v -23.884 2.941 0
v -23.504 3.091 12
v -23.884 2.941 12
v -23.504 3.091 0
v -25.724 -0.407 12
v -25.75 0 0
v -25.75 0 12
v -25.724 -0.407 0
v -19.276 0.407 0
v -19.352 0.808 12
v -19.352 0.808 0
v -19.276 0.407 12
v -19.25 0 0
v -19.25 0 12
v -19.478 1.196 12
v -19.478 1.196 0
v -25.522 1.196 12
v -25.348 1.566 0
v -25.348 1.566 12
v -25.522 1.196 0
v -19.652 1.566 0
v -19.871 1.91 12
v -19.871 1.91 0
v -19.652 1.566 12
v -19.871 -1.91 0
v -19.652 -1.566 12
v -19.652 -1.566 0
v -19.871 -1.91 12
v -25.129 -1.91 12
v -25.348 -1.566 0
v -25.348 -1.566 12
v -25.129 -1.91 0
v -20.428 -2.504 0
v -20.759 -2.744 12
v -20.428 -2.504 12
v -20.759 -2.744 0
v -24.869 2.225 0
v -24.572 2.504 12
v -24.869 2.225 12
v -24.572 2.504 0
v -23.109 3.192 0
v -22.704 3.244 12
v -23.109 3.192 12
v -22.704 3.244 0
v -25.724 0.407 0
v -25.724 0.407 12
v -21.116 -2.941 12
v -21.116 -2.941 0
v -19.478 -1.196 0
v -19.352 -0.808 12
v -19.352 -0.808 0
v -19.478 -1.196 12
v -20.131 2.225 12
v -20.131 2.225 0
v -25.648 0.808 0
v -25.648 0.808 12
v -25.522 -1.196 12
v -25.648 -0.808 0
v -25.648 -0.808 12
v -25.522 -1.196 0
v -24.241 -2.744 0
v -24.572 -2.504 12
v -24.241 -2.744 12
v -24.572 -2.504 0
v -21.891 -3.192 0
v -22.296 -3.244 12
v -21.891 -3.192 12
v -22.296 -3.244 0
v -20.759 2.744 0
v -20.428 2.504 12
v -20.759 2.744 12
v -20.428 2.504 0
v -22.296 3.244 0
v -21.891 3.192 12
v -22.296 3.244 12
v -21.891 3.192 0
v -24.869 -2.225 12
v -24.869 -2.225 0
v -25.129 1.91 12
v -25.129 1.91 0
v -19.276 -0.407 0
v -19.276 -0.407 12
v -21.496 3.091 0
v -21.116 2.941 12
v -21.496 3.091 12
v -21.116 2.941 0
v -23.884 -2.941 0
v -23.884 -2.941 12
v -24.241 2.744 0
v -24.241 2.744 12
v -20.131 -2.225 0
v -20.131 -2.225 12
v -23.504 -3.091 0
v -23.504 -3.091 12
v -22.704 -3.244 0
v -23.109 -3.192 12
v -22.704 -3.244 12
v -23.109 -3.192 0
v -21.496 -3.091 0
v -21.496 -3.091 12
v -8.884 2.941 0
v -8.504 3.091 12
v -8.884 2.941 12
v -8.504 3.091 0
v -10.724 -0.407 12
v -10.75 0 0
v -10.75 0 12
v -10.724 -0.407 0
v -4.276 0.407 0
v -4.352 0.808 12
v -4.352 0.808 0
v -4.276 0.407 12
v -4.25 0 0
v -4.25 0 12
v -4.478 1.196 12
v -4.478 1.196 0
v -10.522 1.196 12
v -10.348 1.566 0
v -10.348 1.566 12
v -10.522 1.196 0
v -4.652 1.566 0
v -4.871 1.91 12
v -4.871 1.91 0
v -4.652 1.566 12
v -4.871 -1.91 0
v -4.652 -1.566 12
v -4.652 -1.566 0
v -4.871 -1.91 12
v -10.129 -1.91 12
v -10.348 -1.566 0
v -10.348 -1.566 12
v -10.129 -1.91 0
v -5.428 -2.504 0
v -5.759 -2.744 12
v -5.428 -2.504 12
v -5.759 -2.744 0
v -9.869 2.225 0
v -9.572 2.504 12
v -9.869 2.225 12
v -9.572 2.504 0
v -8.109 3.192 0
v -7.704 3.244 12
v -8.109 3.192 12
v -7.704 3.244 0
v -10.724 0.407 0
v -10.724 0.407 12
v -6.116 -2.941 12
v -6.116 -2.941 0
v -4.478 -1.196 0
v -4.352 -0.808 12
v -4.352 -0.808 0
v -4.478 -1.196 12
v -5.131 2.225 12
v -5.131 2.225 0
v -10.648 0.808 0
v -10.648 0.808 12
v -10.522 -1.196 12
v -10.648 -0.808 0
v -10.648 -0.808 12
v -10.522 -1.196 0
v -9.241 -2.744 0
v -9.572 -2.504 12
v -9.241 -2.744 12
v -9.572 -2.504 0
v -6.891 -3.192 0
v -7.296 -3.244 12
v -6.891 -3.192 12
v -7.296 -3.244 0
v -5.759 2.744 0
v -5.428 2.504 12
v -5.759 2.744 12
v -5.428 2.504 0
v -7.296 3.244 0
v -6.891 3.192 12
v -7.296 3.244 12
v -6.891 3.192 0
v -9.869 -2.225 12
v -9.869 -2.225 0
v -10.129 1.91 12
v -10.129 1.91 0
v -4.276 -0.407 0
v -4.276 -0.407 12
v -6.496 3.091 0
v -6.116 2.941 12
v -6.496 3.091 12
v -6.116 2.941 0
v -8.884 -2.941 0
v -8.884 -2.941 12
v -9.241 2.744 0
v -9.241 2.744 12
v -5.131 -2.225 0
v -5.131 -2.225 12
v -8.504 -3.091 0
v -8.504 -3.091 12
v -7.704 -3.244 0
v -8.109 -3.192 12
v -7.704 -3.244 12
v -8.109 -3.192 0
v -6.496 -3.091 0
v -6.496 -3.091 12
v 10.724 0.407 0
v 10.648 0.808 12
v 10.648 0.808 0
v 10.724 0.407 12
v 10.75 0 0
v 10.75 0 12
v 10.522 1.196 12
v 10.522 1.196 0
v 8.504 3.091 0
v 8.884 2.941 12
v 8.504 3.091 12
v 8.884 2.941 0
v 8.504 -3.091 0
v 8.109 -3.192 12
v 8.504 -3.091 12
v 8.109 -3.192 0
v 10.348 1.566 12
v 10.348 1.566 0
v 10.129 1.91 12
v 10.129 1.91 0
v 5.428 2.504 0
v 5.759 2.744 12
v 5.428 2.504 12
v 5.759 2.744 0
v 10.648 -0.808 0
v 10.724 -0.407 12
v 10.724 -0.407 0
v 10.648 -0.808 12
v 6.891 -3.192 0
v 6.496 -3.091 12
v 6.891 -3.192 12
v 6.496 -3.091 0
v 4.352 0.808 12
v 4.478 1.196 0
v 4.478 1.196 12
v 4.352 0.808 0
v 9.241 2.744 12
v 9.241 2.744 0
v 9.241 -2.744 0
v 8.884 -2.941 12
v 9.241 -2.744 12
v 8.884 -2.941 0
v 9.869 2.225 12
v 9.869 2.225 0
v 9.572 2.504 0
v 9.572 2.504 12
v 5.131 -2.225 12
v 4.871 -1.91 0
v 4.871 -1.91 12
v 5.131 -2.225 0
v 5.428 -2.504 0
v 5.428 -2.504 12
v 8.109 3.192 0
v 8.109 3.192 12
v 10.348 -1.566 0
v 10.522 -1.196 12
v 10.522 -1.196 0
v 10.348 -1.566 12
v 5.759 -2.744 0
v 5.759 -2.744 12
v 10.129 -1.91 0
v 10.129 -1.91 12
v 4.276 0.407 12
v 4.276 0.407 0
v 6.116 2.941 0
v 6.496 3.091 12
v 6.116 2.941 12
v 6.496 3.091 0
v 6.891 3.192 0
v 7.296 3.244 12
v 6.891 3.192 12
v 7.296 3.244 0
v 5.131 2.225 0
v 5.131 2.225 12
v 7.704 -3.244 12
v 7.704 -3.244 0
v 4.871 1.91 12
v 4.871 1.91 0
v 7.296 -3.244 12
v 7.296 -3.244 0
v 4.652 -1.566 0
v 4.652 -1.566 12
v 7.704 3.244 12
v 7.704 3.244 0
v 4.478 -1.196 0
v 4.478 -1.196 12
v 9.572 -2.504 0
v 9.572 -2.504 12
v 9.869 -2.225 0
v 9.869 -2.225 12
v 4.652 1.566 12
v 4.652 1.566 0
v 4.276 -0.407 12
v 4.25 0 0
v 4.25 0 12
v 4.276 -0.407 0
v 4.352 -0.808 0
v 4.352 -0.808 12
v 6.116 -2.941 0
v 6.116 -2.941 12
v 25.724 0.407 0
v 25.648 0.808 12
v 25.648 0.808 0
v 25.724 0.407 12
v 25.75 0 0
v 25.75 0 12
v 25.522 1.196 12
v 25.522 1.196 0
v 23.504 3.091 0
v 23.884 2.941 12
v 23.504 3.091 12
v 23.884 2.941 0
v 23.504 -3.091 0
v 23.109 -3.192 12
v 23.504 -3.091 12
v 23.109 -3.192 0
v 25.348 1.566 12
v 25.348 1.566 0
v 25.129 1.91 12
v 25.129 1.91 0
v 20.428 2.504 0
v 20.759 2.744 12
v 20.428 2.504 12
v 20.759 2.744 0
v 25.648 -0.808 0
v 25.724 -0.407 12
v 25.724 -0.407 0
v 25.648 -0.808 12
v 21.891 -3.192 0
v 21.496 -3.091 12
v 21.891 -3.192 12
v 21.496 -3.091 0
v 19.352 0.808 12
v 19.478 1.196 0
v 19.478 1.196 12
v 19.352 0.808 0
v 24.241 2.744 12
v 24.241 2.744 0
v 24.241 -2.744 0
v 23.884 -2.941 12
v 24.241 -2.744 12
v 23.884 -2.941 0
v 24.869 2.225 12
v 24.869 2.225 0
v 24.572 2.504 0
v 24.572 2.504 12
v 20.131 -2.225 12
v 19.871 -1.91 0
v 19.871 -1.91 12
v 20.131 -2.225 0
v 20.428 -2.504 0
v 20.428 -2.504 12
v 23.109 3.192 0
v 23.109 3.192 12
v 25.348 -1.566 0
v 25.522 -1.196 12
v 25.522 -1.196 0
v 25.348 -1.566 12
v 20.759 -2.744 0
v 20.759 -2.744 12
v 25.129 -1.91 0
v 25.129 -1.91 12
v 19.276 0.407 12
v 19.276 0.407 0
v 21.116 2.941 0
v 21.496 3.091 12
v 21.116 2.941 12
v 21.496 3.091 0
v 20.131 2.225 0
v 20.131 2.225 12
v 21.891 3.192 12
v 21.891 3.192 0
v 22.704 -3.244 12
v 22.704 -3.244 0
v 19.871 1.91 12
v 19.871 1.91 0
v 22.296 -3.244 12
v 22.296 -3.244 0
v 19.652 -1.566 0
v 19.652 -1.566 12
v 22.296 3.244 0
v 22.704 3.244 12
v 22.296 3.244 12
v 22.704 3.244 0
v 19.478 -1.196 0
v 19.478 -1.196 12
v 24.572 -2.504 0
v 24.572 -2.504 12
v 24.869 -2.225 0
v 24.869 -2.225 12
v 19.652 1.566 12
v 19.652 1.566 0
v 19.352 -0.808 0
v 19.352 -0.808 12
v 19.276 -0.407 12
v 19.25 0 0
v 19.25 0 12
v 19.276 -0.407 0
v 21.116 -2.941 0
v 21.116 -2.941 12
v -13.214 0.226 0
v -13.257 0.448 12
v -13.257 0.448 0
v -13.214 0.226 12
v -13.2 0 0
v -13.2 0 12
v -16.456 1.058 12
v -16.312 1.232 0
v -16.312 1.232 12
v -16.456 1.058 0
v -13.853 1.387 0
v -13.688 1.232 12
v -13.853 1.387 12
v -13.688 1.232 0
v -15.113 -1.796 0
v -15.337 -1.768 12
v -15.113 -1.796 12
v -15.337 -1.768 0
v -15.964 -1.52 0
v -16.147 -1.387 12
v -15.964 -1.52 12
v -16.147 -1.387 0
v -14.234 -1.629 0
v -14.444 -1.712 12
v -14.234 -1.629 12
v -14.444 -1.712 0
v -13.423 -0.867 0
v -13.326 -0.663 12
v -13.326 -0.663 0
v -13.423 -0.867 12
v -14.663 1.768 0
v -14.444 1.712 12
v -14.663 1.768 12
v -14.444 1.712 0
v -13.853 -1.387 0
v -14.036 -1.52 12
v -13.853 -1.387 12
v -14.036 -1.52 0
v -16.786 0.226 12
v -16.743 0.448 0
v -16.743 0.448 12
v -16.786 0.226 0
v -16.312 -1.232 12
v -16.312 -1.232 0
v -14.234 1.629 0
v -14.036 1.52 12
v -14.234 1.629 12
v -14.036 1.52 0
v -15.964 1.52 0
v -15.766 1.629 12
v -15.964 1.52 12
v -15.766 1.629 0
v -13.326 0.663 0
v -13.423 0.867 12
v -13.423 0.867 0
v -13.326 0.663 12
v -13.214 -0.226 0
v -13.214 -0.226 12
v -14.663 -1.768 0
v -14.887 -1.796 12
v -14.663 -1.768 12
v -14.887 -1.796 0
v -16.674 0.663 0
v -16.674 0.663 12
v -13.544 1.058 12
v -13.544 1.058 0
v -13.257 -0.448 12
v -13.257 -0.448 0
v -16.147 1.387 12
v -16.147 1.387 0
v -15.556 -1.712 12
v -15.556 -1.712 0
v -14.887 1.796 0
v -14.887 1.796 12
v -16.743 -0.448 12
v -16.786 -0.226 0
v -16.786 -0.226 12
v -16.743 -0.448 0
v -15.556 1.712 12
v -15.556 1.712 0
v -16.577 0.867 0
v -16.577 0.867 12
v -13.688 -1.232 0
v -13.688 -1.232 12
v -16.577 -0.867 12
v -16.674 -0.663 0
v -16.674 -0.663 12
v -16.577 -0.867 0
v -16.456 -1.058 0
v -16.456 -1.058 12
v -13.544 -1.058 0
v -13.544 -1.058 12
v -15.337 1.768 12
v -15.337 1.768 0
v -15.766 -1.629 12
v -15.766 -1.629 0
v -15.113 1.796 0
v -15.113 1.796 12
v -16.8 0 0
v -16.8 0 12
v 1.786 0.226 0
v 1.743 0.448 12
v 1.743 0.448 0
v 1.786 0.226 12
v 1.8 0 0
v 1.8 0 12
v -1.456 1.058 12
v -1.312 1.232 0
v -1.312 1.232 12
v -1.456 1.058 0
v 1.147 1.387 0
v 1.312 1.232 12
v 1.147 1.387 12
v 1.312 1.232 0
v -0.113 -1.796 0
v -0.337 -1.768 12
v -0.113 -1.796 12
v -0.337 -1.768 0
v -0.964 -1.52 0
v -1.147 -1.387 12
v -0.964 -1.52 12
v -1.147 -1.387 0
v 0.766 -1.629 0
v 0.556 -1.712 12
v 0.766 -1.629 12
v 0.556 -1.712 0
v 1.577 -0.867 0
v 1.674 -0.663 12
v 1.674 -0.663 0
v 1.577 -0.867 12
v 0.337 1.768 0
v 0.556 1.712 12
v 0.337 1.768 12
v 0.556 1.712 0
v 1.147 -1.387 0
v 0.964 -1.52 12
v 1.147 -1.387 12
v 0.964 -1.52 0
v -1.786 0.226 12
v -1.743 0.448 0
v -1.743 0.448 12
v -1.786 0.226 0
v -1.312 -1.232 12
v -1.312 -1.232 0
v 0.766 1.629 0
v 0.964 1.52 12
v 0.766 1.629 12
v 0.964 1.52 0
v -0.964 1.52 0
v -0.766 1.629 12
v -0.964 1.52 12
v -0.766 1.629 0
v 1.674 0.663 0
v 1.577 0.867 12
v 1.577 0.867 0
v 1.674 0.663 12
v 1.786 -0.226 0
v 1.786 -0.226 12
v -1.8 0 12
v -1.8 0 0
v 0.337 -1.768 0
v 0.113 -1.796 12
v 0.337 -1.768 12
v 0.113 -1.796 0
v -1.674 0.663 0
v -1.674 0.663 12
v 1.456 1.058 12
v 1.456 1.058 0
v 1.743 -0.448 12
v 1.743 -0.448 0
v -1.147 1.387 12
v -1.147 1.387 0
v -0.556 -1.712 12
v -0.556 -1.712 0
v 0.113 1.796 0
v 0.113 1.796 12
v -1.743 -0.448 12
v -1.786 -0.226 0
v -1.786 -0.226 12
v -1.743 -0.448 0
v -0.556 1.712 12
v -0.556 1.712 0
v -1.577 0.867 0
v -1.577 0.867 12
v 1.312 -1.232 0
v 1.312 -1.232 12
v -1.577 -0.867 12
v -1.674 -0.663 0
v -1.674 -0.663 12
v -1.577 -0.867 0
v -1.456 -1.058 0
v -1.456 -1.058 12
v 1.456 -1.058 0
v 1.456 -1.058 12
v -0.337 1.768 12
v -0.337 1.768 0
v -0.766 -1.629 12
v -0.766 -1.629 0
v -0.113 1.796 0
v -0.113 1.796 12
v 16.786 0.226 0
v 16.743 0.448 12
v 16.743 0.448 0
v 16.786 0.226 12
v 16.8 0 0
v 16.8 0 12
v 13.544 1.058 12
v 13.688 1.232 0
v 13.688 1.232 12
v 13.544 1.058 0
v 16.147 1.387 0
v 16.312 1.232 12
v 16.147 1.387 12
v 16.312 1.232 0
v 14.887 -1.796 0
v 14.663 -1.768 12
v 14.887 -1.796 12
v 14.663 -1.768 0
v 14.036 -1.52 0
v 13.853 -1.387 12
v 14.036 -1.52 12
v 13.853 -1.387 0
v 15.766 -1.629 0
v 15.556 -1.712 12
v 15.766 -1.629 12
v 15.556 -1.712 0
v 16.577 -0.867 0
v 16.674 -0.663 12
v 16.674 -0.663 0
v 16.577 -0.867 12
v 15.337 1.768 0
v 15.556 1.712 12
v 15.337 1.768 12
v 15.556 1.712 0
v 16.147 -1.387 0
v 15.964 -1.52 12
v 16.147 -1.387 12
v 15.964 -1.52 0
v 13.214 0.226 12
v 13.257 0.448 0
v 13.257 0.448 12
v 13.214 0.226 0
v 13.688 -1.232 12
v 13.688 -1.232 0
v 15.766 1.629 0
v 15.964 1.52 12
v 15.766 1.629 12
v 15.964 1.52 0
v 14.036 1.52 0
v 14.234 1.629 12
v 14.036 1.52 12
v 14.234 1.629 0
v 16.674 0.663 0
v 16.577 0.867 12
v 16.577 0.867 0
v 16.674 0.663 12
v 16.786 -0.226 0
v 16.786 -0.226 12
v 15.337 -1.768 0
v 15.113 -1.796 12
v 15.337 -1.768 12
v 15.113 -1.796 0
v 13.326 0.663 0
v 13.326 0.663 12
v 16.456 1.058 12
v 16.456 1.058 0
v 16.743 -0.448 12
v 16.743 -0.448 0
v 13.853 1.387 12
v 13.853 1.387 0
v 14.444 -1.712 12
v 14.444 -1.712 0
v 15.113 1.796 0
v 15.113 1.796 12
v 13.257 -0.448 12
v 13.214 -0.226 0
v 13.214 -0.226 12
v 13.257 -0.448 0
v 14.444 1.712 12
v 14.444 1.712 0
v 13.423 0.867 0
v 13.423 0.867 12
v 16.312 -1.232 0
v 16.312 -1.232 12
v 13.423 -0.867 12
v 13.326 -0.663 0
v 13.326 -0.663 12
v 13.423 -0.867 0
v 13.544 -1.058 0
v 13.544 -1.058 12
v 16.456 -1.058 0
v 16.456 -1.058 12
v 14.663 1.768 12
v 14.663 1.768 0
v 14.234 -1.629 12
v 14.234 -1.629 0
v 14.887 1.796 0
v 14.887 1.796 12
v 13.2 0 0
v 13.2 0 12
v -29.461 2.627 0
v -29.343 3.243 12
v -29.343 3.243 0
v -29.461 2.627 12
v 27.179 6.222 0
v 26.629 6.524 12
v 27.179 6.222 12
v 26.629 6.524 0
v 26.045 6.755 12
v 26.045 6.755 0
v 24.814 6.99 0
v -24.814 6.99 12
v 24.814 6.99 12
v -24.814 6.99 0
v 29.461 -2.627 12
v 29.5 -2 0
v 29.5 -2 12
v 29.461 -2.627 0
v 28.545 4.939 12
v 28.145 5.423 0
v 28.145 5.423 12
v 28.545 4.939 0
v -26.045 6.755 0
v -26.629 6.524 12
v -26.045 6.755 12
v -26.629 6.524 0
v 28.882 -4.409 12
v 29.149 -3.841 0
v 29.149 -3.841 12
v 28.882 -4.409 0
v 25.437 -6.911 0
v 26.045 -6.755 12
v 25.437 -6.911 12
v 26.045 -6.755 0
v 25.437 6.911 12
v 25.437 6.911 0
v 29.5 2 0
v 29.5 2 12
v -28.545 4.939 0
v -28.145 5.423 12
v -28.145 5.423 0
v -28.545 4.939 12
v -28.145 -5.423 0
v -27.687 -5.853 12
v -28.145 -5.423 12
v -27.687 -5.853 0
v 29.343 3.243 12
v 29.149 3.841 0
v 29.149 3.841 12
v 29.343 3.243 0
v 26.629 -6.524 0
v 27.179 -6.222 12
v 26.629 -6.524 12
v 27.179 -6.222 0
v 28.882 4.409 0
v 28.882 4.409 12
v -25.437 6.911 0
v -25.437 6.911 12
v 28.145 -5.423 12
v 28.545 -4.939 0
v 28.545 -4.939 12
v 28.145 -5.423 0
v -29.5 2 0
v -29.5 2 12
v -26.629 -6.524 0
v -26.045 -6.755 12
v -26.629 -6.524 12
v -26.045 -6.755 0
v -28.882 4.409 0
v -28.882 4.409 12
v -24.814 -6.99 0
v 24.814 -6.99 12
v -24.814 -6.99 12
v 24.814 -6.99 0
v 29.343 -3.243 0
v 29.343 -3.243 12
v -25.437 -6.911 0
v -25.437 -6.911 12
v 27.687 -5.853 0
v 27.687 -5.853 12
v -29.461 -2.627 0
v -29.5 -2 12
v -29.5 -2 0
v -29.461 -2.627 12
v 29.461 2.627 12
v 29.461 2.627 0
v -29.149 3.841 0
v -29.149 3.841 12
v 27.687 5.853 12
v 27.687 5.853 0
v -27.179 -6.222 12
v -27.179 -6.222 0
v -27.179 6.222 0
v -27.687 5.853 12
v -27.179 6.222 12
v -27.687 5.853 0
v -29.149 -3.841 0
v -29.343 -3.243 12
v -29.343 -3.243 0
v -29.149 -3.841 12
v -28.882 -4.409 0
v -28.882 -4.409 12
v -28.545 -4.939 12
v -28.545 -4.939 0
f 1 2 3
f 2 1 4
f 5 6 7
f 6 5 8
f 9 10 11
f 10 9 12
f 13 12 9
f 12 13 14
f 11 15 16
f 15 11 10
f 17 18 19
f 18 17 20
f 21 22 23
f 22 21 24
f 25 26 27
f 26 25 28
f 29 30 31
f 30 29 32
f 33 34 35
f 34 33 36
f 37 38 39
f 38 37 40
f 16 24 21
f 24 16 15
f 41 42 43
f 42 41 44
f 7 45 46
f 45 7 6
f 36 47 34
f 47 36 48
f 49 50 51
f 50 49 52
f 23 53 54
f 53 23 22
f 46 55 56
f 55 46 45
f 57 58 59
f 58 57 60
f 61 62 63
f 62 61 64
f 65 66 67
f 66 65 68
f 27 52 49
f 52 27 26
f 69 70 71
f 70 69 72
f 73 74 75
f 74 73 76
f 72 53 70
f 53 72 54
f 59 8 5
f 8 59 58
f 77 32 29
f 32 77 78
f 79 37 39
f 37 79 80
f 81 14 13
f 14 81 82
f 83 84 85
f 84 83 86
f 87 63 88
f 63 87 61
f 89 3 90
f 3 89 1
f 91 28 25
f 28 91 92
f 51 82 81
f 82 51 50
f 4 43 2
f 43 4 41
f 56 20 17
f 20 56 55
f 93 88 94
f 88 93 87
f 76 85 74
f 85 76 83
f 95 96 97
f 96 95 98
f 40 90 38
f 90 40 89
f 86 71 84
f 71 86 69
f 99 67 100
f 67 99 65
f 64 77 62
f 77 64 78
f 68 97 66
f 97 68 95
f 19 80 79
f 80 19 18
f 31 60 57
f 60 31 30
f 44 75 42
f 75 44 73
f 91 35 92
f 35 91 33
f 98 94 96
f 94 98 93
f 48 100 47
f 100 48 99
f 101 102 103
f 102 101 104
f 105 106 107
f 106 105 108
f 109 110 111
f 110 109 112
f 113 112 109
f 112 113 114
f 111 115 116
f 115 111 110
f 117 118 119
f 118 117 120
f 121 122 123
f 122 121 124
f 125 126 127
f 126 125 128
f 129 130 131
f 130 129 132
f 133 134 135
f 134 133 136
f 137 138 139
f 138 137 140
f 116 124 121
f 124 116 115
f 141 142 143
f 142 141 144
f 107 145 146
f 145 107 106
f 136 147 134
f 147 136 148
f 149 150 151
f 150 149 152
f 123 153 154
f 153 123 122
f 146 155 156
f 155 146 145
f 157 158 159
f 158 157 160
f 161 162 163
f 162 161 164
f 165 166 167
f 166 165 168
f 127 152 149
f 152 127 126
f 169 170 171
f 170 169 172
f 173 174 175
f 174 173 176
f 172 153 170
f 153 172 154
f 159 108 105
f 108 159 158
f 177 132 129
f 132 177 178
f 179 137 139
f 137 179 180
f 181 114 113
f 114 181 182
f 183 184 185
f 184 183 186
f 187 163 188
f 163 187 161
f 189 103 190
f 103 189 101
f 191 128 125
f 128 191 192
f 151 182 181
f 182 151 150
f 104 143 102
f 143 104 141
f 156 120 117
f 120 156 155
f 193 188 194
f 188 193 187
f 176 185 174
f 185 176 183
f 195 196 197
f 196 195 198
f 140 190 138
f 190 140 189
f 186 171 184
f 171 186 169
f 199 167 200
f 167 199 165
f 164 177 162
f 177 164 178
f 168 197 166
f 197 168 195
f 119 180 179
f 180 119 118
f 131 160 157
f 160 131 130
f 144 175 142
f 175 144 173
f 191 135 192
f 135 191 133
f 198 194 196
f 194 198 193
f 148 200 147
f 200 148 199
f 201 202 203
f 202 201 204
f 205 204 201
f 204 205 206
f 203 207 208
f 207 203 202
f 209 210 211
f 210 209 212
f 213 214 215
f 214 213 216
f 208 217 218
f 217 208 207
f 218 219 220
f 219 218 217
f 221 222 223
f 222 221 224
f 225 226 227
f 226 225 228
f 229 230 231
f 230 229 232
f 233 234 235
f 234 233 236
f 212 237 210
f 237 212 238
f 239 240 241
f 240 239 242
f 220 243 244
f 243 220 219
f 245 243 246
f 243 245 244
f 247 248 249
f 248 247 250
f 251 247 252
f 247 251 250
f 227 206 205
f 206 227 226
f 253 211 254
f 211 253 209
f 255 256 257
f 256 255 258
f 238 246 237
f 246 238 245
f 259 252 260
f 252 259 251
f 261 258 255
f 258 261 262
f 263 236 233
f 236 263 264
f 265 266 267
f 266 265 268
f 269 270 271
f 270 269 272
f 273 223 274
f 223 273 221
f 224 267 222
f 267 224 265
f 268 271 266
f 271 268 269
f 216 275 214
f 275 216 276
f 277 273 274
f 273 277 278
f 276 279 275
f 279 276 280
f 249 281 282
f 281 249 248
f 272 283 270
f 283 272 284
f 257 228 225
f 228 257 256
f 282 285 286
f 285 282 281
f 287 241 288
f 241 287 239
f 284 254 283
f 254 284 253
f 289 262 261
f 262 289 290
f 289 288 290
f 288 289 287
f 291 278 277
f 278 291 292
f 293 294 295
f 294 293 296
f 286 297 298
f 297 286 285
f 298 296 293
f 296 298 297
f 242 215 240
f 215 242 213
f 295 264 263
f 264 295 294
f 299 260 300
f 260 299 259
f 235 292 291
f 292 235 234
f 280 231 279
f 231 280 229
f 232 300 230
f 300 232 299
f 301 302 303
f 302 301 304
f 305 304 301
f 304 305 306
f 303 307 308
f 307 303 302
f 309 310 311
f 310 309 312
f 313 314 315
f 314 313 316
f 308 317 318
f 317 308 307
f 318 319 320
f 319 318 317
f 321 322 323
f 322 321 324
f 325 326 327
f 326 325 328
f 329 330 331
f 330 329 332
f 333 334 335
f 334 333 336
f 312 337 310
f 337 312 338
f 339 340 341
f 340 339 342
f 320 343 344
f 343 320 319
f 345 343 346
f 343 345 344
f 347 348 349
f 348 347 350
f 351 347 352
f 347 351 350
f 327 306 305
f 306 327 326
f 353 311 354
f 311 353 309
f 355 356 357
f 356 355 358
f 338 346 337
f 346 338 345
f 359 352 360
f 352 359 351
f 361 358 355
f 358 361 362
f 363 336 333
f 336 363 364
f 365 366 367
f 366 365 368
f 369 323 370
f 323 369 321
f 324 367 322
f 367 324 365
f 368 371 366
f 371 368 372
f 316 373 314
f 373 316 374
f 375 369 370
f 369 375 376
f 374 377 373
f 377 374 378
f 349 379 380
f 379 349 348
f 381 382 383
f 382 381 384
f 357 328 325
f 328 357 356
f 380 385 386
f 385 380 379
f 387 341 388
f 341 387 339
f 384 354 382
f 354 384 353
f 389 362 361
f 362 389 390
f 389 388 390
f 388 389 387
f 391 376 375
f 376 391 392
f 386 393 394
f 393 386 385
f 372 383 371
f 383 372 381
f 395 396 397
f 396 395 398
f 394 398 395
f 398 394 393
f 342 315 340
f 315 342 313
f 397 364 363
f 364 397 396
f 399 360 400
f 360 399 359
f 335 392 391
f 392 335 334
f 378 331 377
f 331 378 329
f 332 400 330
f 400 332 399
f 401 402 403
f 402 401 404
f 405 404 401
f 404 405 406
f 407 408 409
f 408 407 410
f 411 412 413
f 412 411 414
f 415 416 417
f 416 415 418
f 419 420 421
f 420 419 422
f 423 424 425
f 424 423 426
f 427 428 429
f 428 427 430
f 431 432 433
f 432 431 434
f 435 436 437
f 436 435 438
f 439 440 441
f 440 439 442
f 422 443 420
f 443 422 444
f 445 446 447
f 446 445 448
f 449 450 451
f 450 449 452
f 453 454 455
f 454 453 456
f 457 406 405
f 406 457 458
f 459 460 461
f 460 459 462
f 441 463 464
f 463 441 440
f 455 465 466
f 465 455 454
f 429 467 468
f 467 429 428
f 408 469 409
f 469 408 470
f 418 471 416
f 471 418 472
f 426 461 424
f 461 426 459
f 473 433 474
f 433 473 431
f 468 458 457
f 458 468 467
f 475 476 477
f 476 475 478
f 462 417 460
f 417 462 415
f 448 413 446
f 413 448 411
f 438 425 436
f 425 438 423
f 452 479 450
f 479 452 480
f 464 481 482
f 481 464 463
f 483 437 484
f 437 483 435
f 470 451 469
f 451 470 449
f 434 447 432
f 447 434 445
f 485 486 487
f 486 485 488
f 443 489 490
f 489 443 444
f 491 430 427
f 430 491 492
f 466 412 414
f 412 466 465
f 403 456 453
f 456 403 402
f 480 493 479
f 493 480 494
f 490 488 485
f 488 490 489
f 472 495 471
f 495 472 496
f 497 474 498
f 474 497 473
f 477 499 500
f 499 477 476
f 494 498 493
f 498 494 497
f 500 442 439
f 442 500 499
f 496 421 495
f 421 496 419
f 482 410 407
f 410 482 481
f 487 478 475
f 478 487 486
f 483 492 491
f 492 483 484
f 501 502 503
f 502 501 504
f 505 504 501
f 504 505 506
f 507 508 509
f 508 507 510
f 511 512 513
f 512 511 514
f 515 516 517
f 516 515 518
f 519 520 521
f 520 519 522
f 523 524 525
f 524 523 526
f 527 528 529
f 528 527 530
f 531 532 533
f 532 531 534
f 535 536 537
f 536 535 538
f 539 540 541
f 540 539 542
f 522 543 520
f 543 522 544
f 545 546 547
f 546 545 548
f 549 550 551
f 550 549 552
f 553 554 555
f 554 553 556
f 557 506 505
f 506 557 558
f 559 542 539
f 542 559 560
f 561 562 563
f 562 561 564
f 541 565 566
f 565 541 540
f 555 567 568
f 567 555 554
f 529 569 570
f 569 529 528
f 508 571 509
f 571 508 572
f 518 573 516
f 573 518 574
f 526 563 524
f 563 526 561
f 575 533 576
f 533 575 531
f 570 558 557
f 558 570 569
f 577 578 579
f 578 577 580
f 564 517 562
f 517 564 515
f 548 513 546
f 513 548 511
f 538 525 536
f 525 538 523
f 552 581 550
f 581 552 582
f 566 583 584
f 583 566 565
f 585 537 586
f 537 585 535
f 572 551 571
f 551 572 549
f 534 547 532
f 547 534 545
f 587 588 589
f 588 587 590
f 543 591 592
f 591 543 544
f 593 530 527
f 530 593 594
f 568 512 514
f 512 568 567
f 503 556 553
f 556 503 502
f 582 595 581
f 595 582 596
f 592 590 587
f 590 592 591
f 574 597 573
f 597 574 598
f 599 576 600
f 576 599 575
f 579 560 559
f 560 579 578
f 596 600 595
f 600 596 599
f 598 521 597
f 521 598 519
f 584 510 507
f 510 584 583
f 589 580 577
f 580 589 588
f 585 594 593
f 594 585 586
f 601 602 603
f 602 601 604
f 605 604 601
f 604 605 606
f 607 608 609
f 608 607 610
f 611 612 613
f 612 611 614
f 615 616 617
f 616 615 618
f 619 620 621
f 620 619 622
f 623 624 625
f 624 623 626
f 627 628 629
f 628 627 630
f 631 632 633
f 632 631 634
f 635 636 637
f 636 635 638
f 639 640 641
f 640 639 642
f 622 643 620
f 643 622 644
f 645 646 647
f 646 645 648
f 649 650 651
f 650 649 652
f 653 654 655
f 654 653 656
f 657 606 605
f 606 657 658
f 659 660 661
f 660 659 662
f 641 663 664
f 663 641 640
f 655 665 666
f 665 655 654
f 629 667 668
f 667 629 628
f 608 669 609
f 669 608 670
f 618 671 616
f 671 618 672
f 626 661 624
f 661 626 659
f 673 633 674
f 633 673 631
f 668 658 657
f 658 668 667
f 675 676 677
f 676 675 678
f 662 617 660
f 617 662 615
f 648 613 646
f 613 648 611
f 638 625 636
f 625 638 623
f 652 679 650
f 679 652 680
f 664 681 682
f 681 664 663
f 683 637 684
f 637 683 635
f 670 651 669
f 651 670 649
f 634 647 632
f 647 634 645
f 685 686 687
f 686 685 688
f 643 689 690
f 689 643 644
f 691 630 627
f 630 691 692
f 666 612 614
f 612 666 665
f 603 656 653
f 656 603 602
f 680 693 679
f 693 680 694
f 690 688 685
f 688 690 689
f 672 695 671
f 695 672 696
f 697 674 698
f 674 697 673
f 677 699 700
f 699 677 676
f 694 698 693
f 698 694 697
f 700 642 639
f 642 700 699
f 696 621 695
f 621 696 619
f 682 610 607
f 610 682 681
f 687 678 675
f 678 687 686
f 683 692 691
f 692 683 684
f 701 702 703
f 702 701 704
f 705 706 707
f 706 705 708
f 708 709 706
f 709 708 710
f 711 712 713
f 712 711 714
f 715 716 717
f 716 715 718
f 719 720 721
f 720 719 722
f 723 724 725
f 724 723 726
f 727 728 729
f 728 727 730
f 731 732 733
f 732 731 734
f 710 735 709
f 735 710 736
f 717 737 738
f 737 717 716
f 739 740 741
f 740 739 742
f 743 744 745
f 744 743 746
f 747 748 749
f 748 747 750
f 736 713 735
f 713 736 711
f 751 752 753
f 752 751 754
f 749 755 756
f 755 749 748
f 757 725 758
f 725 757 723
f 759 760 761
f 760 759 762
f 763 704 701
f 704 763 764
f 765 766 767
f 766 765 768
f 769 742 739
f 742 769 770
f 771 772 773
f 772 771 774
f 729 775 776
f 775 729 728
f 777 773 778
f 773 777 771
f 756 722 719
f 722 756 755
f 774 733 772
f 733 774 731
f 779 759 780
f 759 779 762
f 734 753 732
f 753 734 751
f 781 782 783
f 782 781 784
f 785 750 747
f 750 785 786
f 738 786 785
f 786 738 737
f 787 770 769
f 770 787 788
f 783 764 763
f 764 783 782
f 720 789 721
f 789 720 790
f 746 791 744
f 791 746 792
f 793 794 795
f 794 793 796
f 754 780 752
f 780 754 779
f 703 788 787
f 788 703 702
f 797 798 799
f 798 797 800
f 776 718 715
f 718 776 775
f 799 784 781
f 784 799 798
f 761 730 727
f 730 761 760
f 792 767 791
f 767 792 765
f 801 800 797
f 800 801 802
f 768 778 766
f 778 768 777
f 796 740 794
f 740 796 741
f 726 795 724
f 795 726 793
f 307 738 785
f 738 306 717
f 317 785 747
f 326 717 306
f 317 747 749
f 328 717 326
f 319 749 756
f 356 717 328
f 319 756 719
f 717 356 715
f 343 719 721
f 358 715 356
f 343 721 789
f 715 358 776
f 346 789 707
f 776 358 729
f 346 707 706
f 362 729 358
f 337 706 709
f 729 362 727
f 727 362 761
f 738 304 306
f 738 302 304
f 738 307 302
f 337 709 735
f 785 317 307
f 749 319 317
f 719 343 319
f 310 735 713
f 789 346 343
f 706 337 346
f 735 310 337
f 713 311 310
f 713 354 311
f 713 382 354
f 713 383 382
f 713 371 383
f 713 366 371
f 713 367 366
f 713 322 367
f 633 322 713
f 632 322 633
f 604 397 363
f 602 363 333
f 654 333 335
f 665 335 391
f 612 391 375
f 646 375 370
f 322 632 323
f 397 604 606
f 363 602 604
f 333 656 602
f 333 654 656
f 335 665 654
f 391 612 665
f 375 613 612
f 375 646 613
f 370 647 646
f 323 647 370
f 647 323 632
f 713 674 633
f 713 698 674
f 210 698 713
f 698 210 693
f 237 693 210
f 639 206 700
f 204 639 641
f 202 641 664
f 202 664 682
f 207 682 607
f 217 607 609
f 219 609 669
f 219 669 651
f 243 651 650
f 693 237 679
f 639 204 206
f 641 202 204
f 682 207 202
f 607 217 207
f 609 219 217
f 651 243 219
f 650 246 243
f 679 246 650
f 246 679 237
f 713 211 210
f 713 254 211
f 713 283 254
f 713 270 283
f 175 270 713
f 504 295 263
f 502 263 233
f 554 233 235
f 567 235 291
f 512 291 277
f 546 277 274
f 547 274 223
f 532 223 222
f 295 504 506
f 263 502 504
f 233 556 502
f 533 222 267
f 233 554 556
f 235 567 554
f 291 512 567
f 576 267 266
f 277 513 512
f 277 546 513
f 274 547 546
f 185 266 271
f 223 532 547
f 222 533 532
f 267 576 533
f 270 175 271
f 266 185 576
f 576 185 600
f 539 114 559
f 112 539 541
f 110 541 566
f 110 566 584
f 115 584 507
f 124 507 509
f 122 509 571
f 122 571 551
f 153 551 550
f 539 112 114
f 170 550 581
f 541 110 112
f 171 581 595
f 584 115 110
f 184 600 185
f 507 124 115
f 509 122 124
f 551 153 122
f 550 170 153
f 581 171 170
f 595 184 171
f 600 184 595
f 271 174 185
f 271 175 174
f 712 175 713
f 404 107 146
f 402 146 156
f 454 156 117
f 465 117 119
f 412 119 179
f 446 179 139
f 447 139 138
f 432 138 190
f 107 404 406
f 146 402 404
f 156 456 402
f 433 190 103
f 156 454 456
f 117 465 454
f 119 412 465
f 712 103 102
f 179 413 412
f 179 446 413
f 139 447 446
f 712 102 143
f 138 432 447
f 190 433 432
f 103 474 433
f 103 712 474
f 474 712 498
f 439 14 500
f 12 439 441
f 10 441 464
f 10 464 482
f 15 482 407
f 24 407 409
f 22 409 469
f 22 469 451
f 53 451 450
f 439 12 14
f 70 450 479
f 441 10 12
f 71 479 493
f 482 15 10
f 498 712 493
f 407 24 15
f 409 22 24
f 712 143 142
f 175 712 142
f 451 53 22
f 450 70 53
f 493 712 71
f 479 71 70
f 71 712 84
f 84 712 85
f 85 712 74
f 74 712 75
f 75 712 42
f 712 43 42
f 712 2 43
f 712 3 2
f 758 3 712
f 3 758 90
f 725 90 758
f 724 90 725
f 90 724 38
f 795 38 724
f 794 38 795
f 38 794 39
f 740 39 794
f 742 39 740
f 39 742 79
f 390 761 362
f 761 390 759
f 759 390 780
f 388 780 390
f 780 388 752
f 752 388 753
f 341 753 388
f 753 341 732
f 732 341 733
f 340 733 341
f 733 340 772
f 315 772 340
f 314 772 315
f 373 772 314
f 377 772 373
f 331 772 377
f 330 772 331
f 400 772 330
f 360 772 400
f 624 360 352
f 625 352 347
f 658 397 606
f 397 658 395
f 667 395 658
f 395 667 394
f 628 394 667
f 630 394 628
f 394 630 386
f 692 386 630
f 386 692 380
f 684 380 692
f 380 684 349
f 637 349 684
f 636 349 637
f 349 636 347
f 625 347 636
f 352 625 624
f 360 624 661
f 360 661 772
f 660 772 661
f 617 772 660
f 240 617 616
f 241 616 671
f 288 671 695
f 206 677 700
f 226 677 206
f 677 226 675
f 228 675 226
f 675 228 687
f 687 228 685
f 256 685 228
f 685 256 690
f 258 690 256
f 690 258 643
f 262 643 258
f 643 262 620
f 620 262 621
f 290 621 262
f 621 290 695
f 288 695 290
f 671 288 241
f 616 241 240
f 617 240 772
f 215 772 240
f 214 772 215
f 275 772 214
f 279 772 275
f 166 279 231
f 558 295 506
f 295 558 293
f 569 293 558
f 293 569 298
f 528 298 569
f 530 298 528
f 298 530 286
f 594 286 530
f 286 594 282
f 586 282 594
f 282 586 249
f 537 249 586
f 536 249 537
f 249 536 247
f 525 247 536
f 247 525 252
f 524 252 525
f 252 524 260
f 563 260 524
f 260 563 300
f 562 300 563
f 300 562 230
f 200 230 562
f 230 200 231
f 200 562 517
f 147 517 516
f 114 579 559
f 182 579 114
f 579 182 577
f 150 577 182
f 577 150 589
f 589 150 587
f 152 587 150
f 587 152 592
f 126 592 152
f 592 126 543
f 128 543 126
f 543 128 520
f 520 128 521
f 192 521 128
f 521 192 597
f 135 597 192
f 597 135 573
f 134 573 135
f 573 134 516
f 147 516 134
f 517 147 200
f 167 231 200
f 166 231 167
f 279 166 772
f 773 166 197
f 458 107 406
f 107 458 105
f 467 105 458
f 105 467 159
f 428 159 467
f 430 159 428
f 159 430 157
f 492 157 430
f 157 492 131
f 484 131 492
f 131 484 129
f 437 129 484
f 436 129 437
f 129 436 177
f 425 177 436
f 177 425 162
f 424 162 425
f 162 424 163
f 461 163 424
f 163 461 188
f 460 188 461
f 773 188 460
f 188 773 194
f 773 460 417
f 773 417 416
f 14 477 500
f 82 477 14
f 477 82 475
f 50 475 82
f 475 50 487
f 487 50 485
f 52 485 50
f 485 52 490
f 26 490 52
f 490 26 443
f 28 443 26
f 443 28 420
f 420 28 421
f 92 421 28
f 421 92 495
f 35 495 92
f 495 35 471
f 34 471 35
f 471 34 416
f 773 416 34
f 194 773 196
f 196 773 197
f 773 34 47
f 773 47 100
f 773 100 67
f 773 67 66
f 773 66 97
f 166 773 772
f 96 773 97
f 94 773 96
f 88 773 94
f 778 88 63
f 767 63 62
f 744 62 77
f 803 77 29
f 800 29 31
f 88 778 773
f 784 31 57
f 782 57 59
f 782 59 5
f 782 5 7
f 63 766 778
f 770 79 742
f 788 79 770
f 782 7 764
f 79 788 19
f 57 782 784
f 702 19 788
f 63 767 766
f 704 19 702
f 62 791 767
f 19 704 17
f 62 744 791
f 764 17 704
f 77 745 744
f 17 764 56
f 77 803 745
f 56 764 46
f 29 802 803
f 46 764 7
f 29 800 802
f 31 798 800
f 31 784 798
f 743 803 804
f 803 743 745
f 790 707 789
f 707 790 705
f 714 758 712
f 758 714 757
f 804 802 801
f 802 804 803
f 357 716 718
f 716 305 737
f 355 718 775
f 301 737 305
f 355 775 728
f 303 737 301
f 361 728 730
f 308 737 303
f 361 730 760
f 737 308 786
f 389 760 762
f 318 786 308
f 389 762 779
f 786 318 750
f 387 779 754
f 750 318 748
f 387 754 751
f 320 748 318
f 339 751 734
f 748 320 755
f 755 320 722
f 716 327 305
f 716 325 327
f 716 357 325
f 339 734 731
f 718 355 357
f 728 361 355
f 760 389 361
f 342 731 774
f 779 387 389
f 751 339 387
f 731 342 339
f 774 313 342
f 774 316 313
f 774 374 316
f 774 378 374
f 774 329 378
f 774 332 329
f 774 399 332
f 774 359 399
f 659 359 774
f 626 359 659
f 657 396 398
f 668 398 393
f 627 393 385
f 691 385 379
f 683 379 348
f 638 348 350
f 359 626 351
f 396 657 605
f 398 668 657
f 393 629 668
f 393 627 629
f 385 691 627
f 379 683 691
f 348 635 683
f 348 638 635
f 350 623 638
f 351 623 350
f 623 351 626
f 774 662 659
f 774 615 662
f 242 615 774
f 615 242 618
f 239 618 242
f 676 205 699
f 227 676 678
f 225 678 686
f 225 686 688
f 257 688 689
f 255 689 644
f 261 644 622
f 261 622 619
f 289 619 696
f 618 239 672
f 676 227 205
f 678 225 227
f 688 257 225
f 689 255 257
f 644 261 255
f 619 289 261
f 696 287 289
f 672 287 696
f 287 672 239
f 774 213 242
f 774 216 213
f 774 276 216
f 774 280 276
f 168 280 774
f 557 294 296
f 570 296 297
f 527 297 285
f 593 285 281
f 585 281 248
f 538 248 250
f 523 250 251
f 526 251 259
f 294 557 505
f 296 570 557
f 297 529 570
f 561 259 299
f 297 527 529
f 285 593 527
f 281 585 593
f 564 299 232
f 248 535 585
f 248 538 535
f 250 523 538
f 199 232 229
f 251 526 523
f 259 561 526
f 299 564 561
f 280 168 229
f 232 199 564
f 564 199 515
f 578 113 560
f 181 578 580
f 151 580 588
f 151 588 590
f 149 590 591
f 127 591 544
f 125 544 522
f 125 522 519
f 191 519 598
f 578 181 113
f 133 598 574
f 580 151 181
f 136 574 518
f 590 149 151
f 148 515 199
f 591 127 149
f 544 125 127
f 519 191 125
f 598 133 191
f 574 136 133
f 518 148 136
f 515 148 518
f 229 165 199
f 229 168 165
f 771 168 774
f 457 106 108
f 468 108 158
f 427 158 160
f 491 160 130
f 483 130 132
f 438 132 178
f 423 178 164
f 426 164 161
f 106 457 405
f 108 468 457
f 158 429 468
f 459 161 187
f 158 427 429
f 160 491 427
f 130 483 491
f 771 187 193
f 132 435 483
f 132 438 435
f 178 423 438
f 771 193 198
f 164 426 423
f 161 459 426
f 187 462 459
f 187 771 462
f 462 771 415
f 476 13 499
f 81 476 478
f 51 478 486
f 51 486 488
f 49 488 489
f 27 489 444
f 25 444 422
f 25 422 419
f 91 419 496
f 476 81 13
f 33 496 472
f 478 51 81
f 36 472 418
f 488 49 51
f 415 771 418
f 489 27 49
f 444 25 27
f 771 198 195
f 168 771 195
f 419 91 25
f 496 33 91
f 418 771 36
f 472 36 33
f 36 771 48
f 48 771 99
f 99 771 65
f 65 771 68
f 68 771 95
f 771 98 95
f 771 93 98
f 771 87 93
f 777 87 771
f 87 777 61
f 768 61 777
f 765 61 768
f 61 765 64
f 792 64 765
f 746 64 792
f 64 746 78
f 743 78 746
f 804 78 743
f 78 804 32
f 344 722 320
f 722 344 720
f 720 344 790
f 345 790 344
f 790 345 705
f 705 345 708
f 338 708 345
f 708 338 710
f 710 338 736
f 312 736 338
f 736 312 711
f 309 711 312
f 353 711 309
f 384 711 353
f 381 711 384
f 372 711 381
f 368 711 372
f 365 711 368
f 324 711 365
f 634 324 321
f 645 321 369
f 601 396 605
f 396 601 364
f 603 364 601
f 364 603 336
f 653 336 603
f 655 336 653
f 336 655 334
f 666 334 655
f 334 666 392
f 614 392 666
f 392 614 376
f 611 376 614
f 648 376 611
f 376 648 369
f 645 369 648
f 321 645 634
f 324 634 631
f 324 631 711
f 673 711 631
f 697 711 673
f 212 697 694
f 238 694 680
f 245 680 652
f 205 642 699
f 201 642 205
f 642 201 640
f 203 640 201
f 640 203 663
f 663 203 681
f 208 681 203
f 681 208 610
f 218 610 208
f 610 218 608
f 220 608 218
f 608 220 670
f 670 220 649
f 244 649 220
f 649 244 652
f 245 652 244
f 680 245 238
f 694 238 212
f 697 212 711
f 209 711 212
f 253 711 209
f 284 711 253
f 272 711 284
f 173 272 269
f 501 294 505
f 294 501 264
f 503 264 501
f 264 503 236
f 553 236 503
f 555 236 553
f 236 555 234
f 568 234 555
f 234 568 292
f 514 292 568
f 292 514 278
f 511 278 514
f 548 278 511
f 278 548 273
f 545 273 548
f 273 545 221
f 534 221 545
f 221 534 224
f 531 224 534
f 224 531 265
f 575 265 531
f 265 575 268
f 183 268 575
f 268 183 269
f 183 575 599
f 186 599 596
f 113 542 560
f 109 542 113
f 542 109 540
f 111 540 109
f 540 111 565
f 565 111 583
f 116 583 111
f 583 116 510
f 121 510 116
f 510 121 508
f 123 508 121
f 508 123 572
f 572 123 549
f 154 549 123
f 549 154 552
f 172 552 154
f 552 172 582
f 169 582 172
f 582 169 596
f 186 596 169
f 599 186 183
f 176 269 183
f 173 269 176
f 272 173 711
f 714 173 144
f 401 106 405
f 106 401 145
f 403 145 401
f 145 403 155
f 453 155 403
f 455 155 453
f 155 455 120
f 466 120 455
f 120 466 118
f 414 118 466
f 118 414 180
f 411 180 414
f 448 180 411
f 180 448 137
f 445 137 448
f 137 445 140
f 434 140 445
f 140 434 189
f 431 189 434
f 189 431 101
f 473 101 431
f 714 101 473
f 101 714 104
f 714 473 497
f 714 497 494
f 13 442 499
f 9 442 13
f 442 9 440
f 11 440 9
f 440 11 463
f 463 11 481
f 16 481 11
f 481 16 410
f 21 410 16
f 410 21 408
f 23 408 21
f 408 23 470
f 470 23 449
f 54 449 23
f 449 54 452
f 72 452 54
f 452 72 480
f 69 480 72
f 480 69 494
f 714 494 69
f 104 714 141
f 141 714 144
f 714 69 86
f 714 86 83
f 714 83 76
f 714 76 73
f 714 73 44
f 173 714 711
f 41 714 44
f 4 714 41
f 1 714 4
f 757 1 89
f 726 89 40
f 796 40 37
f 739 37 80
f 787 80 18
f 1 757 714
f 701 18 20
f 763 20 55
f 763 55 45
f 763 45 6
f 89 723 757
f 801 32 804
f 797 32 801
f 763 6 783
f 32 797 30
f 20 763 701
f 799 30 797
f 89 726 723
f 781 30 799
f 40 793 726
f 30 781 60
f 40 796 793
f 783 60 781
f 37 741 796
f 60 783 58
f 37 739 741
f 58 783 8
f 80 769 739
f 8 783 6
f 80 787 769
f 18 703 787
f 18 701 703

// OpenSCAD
$fn = 50;


difference() {
	union() {
		*color(alpha = 1.0000000000, c = "gray") {
			translate(v = [0, 7, 0]) {
				linear_extrude(height = 1) {
					text(font = "Arial:style=Bold", halign = "center", size = 4.5000000000, text = "COMMENT plate main", valign = "center");
				}
			}
		}
		hull() {
			translate(v = [-24.5000000000, 2.0000000000, 0]) {
				cylinder(h = 12, r = 5);
			}
			translate(v = [24.5000000000, 2.0000000000, 0]) {
				cylinder(h = 12, r = 5);
			}
			translate(v = [-24.5000000000, -2.0000000000, 0]) {
				cylinder(h = 12, r = 5);
			}
			translate(v = [24.5000000000, -2.0000000000, 0]) {
				cylinder(h = 12, r = 5);
			}
		}
	}
	union() {
		*color(alpha = 1.0000000000, c = "gray") {
			translate(v = [0, 7, 0]) {
				linear_extrude(height = 1) {
					text(font = "Arial:style=Bold", halign = "center", size = 4.5000000000, text = "COMMENT holes main", valign = "center");
				}
			}
		}
		translate(v = [-22.5000000000, 0.0000000000, 0]) {
			translate(v = [0, 0, -100]) {
				cylinder(h = 200, r = 3.2500000000);
			}
		}
		translate(v = [-7.5000000000, 0.0000000000, 0]) {
			translate(v = [0, 0, -100]) {
				cylinder(h = 200, r = 3.2500000000);
			}
		}
		translate(v = [7.5000000000, 0.0000000000, 0]) {
			translate(v = [0, 0, -100]) {
				cylinder(h = 200, r = 3.2500000000);
			}
		}
		translate(v = [22.5000000000, 0.0000000000, 0]) {
			translate(v = [0, 0, -100]) {
				cylinder(h = 200, r = 3.2500000000);
			}
		}
		translate(v = [-22.5000000000, 0.0000000000, 0]) {
			translate(v = [0, 0, -100]) {
				cylinder(h = 200, r = 1.8000000000);
			}
		}
		translate(v = [-15.0000000000, 0.0000000000, 0]) {
			translate(v = [0, 0, -100]) {
				cylinder(h = 200, r = 1.8000000000);
			}
		}
		translate(v = [-7.5000000000, 0.0000000000, 0]) {
			translate(v = [0, 0, -100]) {
				cylinder(h = 200, r = 1.8000000000);
			}
		}
		translate(v = [0, 0, -100]) {
			cylinder(h = 200, r = 1.8000000000);
		}
		translate(v = [7.5000000000, 0.0000000000, 0]) {
			translate(v = [0, 0, -100]) {
				cylinder(h = 200, r = 1.8000000000);
			}
		}
		translate(v = [15.0000000000, 0.0000000000, 0]) {
			translate(v = [0, 0, -100]) {
				cylinder(h = 200, r = 1.8000000000);
			}
		}
		translate(v = [22.5000000000, 0.0000000000, 0]) {
			translate(v = [0, 0, -100]) {
				cylinder(h = 200, r = 1.8000000000);
			}
		}
	}
}
